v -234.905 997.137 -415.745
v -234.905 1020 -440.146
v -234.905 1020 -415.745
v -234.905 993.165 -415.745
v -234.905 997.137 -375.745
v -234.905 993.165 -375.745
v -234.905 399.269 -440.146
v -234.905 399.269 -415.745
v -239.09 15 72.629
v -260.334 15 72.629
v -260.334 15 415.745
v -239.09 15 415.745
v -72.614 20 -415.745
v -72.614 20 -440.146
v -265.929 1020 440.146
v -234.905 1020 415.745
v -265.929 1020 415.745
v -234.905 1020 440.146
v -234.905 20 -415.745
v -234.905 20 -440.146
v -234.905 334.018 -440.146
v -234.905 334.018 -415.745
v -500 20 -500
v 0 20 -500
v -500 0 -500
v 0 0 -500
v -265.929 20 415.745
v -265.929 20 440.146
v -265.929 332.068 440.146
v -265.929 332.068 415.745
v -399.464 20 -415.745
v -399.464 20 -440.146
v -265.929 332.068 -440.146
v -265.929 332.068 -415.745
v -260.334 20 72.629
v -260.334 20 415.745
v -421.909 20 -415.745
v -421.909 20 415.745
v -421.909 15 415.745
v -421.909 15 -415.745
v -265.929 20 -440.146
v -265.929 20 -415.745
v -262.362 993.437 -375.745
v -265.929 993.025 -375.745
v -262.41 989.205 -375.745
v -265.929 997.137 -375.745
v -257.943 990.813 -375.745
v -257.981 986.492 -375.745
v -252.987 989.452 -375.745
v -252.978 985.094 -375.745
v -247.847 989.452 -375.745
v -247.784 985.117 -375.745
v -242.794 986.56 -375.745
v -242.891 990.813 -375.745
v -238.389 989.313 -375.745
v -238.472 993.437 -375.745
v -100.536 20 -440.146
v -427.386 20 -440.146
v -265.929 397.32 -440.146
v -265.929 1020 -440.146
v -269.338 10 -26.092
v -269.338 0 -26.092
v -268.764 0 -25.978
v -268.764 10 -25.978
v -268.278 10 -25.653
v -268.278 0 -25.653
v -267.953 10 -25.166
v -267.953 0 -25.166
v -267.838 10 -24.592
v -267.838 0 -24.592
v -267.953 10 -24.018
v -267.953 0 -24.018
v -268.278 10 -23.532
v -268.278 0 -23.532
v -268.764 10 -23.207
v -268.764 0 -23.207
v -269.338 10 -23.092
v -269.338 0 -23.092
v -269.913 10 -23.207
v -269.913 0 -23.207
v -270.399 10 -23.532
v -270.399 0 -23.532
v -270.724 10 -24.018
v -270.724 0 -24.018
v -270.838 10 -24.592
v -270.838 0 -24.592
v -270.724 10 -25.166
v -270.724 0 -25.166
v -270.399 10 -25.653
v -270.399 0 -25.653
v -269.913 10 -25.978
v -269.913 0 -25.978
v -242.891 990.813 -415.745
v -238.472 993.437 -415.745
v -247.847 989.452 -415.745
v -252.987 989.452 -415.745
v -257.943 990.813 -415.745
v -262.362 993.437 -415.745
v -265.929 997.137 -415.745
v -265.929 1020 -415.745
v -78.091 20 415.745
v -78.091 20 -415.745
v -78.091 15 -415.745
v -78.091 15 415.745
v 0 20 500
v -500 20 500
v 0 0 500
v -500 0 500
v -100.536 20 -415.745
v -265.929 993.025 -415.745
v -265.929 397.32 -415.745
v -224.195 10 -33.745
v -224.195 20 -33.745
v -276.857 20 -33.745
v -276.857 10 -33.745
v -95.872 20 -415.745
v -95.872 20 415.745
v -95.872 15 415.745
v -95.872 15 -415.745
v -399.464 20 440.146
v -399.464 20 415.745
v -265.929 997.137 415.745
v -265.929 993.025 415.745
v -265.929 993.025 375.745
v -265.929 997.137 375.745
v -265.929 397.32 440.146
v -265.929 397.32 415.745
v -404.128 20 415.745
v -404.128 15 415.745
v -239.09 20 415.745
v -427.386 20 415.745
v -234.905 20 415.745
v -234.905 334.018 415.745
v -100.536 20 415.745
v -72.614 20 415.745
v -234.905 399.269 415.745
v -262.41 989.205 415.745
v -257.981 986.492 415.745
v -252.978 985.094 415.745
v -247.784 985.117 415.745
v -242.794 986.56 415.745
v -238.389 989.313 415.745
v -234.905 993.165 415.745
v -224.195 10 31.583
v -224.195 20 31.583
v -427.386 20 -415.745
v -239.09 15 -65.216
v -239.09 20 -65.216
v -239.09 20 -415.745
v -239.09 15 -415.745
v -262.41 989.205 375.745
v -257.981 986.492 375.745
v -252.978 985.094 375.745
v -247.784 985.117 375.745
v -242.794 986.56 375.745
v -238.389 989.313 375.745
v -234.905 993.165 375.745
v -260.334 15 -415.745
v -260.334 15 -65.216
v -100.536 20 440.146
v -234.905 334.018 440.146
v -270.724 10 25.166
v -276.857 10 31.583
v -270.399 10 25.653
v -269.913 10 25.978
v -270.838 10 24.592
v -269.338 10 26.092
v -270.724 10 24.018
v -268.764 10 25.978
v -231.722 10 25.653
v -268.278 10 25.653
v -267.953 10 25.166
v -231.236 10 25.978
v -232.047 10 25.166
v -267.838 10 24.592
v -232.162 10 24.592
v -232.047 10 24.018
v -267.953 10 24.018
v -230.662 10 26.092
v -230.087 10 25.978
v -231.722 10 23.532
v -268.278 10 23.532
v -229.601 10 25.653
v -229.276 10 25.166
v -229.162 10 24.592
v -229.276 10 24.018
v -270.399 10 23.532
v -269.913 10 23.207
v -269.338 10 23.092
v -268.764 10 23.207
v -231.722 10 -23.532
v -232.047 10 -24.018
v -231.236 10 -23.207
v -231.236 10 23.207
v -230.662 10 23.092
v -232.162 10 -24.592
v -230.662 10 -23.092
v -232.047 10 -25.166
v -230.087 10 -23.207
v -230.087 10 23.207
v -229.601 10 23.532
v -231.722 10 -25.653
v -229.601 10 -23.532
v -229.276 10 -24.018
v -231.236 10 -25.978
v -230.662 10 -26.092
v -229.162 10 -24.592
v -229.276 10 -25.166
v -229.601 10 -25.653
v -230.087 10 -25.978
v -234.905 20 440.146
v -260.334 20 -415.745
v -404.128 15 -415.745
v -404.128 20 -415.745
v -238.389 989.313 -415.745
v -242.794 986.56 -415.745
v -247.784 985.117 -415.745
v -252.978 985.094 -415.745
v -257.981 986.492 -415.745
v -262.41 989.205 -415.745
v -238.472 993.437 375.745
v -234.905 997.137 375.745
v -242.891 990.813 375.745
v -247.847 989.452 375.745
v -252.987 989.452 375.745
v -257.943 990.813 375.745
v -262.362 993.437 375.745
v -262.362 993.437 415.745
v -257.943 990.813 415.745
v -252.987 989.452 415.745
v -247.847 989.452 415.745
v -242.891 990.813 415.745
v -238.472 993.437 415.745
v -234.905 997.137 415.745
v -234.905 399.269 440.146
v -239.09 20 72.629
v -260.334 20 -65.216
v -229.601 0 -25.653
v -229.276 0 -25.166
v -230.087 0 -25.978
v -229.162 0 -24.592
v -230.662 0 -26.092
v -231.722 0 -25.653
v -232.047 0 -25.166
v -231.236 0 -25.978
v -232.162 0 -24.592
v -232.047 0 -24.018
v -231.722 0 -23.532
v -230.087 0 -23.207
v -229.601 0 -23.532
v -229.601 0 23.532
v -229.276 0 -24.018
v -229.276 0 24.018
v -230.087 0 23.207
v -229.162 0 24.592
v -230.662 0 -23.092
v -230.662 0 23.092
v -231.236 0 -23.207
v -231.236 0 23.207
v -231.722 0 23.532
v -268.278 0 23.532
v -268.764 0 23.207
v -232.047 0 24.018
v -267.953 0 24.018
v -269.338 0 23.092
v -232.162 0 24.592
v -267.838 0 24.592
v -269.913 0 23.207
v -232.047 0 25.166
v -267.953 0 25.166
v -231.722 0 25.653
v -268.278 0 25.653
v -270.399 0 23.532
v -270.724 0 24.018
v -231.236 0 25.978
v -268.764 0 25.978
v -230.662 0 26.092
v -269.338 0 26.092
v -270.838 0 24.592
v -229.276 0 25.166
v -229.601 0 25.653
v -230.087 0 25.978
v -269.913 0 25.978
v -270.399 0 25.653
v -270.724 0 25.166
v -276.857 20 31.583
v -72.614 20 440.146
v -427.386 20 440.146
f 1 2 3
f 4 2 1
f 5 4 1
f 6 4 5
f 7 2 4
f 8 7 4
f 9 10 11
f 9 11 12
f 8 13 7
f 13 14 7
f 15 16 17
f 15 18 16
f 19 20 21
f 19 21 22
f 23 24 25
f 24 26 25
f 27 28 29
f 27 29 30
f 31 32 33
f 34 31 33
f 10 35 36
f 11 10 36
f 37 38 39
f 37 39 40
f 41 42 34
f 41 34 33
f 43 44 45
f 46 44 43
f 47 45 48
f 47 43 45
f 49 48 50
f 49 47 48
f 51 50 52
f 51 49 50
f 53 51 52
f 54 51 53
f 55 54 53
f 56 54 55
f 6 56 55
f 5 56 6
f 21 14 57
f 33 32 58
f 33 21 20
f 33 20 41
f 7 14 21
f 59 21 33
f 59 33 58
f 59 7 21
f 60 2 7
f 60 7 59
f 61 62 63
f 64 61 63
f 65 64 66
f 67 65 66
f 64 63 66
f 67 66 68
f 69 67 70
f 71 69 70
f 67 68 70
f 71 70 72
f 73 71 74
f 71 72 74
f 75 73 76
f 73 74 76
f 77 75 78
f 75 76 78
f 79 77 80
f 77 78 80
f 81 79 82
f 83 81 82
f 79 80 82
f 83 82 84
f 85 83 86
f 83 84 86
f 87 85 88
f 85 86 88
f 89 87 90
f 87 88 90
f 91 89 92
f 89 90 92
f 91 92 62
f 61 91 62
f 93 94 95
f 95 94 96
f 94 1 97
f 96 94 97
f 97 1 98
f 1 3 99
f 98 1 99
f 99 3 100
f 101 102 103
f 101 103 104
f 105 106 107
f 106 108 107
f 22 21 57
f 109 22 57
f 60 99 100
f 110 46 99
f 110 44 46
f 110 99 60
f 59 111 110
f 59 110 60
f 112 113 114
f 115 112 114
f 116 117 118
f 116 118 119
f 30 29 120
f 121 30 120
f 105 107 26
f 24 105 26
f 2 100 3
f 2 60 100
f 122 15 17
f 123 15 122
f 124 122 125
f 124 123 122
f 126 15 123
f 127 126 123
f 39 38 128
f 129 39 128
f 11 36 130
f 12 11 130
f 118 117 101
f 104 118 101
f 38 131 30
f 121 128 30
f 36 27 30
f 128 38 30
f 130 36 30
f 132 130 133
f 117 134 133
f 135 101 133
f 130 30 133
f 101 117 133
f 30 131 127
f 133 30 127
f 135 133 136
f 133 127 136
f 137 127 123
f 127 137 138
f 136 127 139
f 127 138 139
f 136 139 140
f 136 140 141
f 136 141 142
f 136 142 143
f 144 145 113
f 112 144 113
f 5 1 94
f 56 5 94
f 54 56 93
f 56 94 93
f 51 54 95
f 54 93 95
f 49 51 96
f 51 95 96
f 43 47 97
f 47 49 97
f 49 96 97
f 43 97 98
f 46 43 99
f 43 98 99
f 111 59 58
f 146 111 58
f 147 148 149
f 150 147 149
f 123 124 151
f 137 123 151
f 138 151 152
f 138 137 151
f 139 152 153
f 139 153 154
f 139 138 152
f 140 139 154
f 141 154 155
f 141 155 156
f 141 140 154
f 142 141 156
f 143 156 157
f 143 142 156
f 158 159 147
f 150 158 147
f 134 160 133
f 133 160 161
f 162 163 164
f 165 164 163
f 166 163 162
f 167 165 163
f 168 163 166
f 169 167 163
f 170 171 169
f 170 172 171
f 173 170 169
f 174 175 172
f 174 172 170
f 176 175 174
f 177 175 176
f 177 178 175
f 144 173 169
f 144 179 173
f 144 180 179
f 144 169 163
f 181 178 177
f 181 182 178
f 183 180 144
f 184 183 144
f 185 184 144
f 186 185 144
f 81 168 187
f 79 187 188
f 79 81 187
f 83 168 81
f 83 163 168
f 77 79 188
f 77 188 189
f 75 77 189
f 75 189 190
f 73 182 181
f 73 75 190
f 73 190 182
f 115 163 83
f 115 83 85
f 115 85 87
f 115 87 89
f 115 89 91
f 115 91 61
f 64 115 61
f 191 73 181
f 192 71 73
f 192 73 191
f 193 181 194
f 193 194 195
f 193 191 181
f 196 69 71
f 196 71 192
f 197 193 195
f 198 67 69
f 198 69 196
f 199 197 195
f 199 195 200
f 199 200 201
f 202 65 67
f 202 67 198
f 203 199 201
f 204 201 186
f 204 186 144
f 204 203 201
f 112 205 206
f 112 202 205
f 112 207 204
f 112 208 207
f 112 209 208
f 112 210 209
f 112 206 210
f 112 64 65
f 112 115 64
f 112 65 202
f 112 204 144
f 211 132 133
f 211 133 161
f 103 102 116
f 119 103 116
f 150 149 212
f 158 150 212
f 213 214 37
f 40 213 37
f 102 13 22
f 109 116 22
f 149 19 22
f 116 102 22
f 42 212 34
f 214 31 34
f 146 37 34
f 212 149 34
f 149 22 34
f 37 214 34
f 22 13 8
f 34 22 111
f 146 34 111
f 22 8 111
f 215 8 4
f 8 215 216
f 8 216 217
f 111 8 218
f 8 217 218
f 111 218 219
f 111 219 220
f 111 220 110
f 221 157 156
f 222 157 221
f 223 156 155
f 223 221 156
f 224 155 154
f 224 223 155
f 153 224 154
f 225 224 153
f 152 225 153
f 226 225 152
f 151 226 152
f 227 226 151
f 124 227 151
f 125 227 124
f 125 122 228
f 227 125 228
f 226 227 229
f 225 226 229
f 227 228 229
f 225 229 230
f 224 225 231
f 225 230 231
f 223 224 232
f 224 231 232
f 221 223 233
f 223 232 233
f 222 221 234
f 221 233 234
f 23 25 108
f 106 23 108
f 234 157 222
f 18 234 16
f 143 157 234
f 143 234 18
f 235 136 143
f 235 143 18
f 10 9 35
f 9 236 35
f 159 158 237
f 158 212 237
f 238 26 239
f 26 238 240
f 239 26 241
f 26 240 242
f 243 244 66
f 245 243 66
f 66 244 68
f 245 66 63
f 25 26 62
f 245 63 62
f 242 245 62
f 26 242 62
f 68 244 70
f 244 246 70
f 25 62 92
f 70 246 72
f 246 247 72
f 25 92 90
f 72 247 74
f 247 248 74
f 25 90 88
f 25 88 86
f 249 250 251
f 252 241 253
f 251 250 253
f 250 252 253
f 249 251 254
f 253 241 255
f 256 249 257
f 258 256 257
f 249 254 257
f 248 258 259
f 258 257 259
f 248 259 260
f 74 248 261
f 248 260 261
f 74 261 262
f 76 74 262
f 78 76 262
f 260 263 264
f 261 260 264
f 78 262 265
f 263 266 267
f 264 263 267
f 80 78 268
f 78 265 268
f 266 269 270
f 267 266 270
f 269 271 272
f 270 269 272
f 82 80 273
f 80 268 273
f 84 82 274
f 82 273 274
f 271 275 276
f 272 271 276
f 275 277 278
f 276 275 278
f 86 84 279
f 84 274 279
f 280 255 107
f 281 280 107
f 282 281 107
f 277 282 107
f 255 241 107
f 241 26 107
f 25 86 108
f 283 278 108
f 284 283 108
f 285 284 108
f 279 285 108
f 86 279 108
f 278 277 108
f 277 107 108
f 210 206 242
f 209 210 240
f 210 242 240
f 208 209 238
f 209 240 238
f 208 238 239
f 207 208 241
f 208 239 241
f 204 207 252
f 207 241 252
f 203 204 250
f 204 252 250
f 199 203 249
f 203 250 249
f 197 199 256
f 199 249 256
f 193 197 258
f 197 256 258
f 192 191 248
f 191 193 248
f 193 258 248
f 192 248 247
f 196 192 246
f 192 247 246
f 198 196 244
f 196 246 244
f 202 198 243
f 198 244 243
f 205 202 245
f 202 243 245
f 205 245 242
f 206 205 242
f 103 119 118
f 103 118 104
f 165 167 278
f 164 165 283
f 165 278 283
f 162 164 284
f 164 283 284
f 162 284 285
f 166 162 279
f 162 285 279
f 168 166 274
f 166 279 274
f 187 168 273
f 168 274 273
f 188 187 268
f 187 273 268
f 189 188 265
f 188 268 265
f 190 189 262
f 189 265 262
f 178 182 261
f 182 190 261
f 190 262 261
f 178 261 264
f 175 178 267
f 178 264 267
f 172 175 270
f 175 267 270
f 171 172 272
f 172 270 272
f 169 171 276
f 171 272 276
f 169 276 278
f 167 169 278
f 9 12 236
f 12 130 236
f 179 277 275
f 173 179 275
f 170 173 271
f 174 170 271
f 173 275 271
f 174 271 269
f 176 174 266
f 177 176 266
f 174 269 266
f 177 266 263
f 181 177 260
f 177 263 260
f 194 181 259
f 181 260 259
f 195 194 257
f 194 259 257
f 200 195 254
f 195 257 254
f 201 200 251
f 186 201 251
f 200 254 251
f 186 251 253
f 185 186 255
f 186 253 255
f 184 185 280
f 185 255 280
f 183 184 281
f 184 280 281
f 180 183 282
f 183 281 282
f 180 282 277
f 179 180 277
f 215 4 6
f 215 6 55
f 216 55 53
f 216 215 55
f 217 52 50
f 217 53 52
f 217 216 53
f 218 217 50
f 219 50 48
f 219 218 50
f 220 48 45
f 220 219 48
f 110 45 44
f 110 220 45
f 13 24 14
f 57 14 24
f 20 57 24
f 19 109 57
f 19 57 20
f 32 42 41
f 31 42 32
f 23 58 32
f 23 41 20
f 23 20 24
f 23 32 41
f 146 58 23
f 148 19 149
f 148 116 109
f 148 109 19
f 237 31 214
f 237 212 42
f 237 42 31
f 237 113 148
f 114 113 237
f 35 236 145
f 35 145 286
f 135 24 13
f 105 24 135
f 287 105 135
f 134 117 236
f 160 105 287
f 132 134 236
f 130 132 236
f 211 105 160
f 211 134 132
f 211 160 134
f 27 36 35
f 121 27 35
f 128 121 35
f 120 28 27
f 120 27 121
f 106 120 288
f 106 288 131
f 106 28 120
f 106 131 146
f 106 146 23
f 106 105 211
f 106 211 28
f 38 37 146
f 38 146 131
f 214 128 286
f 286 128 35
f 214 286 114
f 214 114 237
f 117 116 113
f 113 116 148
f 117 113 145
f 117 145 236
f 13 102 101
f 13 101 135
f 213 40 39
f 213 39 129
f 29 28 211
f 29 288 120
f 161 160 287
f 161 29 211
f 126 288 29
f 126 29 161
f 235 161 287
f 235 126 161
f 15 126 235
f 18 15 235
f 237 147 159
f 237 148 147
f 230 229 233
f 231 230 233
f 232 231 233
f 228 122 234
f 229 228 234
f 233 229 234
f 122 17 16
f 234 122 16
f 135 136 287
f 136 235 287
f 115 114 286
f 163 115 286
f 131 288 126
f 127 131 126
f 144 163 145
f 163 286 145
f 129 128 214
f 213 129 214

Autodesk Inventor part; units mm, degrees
ref_plane "YZ Plane" through (0, 0, 0) normal (1, 0, 0) x (0, 1, 0)
ref_plane "XZ Plane" through (0, 0, 0) normal (0, 1, 0) x (-1, 0, 0)
sketch "Boceto1" plane through (0, 0, 0) normal (0, 1, 0) x (-1, 0, 0)
  line L0 (0, 0) -> (0, -500) construction
  line L1 (0, -500) -> (500, -500) construction
  line L2 (500, -500) -> (500, 500) construction
  line L3 (500, 500) -> (0, 500) construction
  line L4 (0, 500) -> (0, 0) construction
  line L5 (500, 500) -> (0, 500)
  line L6 (0, 500) -> (0, -500)
  line L7 (0, -500) -> (500, -500)
  line L8 (500, -500) -> (500, 500)
  dimension "d0" = 500
  dimension "d1" = 500
  dimension "d2" = 1000
extrude "Extrusión1" add sketch "Boceto1" along normal blind 20
sketch "Boceto2" plane through (0, 20, 0) normal (0, 1, 0) x (1, 0, 0)
  line L0 (0, 500) -> (-500, 500) construction
  line L1 (-250, 500) -> (-250, -500) construction
  line L2 (-500, -500) -> (0, -500) construction
  line L3 (-265.9292, 440.1456) -> (-234.905, 440.1456)
  line L4 (-234.905, 440.1456) -> (-234.905, 415.7448)
  line L5 (-234.905, 415.7448) -> (-265.9292, 415.7448)
  line L6 (-265.9292, 415.7448) -> (-265.9292, 440.1456)
  point P0 (0, 0)
extrude "Extrusión2" add sketch "Boceto2" along normal blind 1000
mirror "Simetría1" about plane through (0, 0, 0) normal (0, 0, 1) of "Extrusión2"
sketch "Boceto4" plane through (-265.9292, 20, 440.1456) normal (0, 0, 1) x (1, 0, 0)
  line L0 (31.0242, 0) -> (31.0242, 1000) construction
  line L1 (31.0242, 379.2693) -> (193.3148, 0) construction
  line L2 (31.0242, 314.0177) -> (165.3935, 0) construction
  line L3 (-234.0708, 0) -> (265.9292, 0) construction
  line L4 (31.0242, 379.2693) -> (193.3148, 0)
  line L5 (165.3935, 0) -> (31.0242, 314.0177)
  line L6 (31.0242, 379.2693) -> (31.0242, 314.0177)
  line L7 (165.3935, 0) -> (193.3148, 0)
  point P0 (265.9292, -20)
extrude "Extrusión3" add sketch "Boceto4" against normal up to surface (24.4008 mm away)
ref_plane "Plano de trabajo1" through (-250, 0, 500) normal (1, 0, 0) x (0, 0, -1)
mirror "Simetría2" about plane through (-250, 0, 500) normal (1, 0, 0) of "Extrusión3"
mirror "Simetría3" about plane through (0, 0, 0) normal (0, 0, 1) of "Extrusión3", "Simetría2"
sketch "Boceto5" plane through (0, 20, 0) normal (0, 1, 0) x (1, 0, 0)
  line L0 (-72.6144, 415.7448) -> (-234.905, 415.7448) construction
  line L1 (-78.0914, 415.7448) -> (-78.0914, 405.899) construction
  line L2 (-95.8718, 415.7448) -> (-95.8718, 405.899) construction
  line L3 (-78.0914, 415.7448) -> (-95.8718, 415.7448)
  line L4 (-95.8718, 0) -> (-95.8718, 415.7448)
  line L5 (-78.0914, 415.7448) -> (-78.0914, 0)
  line L6 (-78.0914, 0) -> (-78.0914, -415.7448)
  line L7 (-100.5357, -415.7448) -> (-72.6144, -415.7448) projected
  line L8 (-95.8718, 0) -> (-95.8718, -415.7448)
  line L9 (-78.0914, -415.7448) -> (-95.8718, -415.7448)
  point P0 (0, 0)
extrude "Extrusión4" cut sketch "Boceto5" against normal blind 5
mirror "Simetría4" about plane through (-250, 0, 500) normal (1, 0, 0) of "Extrusión4"
sketch "Boceto6" plane through (0, 20, 0) normal (0, 1, 0) x (1, 0, 0)
  line L0 (-265.9292, 415.7448) -> (-234.905, 415.7448) construction
  line L1 (-239.0903, 415.7448) -> (-239.0903, 391.5107) construction
  line L2 (-260.3339, 415.7448) -> (-260.3339, 390.2687) construction
  line L3 (-265.9292, -415.7448) -> (-234.905, -415.7448) construction
  line L4 (-239.0903, 415.7448) -> (-260.3339, 415.7448) construction
  line L5 (-260.3339, -415.7448) -> (-239.0903, -415.7448) construction
  line L6 (-239.0903, -415.7448) -> (-260.3339, -415.7448)
  line L7 (-239.0903, 415.7448) -> (-260.3339, 415.7448)
  line L8 (-239.0903, 65.2159) -> (-260.3339, 65.2159)
  line L9 (-239.0903, -72.6288) -> (-260.3339, -72.6288)
  line L10 (-239.0903, -415.7448) -> (-239.0903, -72.6288)
  line L11 (-239.0903, 65.2159) -> (-239.0903, 415.7448)
  line L12 (-260.3339, 415.7448) -> (-260.3339, 65.2159)
  line L13 (-260.3339, -72.6288) -> (-260.3339, -415.7448)
  point P0 (0, 0)
extrude "Extrusión5" cut sketch "Boceto6" against normal blind 5
sketch "Boceto7" plane through (0, 20, 0) normal (0, 1, 0) x (1, 0, 0)
  line L0 (-224.1946, 33.7447) -> (-276.8566, 33.7447)
  line L1 (-276.8566, 33.7447) -> (-276.8566, -31.5828)
  line L2 (-276.8566, -31.5828) -> (-224.1946, -31.5828)
  line L3 (-224.1946, -31.5828) -> (-224.1946, 33.7447)
  point P0 (0, 0)
extrude "Extrusión6" cut sketch "Boceto7" against normal blind 10
sketch "Boceto8" plane through (0, 10, 0) normal (0, 1, 0) x (1, 0, 0)
  point P0 (0, 0)
  point P1 (-230.6615, -24.5924)
hole "Agujero1" at (-230.6615, 10, 24.5924) direction (0, -1, 0) diameter 3 end through all
mirror "Simetría5" about plane through (-250, 0, 500) normal (1, 0, 0) of "Agujero1"
mirror "Simetría6" about plane through (0, 0, 0) normal (0, 0, 1) of "Agujero1", "Simetría5"
sketch "Boceto9" plane through (-265.9292, 397.3198, -415.7448) normal (0, 0, 1) x (1, 0, 0)
  line L0 (0, 0) -> (0, 622.6802) projected
  line L1 (31.0242, 1.9495) -> (31.0242, 622.6802) projected
  arc A0 (0, 595.7054) -> (31.0242, 595.8449) centre (15.4643, 606.4176) ccw
  line L2 (0, 595.7054) -> (0, 599.8174)
  line L3 (31.0242, 595.8449) -> (31.0242, 599.8174)
  arc A1 (0, 599.8174) -> (31.0242, 599.8174) centre (15.5121, 611.2009) ccw
  point P0 (265.9292, -397.3198)
extrude "Extrusión7" add sketch "Boceto9" along normal blind 40
mirror "Simetría7" about plane through (0, 0, 0) normal (0, 0, 1) of "Extrusión7"
properties part number "Structure_provisional"
